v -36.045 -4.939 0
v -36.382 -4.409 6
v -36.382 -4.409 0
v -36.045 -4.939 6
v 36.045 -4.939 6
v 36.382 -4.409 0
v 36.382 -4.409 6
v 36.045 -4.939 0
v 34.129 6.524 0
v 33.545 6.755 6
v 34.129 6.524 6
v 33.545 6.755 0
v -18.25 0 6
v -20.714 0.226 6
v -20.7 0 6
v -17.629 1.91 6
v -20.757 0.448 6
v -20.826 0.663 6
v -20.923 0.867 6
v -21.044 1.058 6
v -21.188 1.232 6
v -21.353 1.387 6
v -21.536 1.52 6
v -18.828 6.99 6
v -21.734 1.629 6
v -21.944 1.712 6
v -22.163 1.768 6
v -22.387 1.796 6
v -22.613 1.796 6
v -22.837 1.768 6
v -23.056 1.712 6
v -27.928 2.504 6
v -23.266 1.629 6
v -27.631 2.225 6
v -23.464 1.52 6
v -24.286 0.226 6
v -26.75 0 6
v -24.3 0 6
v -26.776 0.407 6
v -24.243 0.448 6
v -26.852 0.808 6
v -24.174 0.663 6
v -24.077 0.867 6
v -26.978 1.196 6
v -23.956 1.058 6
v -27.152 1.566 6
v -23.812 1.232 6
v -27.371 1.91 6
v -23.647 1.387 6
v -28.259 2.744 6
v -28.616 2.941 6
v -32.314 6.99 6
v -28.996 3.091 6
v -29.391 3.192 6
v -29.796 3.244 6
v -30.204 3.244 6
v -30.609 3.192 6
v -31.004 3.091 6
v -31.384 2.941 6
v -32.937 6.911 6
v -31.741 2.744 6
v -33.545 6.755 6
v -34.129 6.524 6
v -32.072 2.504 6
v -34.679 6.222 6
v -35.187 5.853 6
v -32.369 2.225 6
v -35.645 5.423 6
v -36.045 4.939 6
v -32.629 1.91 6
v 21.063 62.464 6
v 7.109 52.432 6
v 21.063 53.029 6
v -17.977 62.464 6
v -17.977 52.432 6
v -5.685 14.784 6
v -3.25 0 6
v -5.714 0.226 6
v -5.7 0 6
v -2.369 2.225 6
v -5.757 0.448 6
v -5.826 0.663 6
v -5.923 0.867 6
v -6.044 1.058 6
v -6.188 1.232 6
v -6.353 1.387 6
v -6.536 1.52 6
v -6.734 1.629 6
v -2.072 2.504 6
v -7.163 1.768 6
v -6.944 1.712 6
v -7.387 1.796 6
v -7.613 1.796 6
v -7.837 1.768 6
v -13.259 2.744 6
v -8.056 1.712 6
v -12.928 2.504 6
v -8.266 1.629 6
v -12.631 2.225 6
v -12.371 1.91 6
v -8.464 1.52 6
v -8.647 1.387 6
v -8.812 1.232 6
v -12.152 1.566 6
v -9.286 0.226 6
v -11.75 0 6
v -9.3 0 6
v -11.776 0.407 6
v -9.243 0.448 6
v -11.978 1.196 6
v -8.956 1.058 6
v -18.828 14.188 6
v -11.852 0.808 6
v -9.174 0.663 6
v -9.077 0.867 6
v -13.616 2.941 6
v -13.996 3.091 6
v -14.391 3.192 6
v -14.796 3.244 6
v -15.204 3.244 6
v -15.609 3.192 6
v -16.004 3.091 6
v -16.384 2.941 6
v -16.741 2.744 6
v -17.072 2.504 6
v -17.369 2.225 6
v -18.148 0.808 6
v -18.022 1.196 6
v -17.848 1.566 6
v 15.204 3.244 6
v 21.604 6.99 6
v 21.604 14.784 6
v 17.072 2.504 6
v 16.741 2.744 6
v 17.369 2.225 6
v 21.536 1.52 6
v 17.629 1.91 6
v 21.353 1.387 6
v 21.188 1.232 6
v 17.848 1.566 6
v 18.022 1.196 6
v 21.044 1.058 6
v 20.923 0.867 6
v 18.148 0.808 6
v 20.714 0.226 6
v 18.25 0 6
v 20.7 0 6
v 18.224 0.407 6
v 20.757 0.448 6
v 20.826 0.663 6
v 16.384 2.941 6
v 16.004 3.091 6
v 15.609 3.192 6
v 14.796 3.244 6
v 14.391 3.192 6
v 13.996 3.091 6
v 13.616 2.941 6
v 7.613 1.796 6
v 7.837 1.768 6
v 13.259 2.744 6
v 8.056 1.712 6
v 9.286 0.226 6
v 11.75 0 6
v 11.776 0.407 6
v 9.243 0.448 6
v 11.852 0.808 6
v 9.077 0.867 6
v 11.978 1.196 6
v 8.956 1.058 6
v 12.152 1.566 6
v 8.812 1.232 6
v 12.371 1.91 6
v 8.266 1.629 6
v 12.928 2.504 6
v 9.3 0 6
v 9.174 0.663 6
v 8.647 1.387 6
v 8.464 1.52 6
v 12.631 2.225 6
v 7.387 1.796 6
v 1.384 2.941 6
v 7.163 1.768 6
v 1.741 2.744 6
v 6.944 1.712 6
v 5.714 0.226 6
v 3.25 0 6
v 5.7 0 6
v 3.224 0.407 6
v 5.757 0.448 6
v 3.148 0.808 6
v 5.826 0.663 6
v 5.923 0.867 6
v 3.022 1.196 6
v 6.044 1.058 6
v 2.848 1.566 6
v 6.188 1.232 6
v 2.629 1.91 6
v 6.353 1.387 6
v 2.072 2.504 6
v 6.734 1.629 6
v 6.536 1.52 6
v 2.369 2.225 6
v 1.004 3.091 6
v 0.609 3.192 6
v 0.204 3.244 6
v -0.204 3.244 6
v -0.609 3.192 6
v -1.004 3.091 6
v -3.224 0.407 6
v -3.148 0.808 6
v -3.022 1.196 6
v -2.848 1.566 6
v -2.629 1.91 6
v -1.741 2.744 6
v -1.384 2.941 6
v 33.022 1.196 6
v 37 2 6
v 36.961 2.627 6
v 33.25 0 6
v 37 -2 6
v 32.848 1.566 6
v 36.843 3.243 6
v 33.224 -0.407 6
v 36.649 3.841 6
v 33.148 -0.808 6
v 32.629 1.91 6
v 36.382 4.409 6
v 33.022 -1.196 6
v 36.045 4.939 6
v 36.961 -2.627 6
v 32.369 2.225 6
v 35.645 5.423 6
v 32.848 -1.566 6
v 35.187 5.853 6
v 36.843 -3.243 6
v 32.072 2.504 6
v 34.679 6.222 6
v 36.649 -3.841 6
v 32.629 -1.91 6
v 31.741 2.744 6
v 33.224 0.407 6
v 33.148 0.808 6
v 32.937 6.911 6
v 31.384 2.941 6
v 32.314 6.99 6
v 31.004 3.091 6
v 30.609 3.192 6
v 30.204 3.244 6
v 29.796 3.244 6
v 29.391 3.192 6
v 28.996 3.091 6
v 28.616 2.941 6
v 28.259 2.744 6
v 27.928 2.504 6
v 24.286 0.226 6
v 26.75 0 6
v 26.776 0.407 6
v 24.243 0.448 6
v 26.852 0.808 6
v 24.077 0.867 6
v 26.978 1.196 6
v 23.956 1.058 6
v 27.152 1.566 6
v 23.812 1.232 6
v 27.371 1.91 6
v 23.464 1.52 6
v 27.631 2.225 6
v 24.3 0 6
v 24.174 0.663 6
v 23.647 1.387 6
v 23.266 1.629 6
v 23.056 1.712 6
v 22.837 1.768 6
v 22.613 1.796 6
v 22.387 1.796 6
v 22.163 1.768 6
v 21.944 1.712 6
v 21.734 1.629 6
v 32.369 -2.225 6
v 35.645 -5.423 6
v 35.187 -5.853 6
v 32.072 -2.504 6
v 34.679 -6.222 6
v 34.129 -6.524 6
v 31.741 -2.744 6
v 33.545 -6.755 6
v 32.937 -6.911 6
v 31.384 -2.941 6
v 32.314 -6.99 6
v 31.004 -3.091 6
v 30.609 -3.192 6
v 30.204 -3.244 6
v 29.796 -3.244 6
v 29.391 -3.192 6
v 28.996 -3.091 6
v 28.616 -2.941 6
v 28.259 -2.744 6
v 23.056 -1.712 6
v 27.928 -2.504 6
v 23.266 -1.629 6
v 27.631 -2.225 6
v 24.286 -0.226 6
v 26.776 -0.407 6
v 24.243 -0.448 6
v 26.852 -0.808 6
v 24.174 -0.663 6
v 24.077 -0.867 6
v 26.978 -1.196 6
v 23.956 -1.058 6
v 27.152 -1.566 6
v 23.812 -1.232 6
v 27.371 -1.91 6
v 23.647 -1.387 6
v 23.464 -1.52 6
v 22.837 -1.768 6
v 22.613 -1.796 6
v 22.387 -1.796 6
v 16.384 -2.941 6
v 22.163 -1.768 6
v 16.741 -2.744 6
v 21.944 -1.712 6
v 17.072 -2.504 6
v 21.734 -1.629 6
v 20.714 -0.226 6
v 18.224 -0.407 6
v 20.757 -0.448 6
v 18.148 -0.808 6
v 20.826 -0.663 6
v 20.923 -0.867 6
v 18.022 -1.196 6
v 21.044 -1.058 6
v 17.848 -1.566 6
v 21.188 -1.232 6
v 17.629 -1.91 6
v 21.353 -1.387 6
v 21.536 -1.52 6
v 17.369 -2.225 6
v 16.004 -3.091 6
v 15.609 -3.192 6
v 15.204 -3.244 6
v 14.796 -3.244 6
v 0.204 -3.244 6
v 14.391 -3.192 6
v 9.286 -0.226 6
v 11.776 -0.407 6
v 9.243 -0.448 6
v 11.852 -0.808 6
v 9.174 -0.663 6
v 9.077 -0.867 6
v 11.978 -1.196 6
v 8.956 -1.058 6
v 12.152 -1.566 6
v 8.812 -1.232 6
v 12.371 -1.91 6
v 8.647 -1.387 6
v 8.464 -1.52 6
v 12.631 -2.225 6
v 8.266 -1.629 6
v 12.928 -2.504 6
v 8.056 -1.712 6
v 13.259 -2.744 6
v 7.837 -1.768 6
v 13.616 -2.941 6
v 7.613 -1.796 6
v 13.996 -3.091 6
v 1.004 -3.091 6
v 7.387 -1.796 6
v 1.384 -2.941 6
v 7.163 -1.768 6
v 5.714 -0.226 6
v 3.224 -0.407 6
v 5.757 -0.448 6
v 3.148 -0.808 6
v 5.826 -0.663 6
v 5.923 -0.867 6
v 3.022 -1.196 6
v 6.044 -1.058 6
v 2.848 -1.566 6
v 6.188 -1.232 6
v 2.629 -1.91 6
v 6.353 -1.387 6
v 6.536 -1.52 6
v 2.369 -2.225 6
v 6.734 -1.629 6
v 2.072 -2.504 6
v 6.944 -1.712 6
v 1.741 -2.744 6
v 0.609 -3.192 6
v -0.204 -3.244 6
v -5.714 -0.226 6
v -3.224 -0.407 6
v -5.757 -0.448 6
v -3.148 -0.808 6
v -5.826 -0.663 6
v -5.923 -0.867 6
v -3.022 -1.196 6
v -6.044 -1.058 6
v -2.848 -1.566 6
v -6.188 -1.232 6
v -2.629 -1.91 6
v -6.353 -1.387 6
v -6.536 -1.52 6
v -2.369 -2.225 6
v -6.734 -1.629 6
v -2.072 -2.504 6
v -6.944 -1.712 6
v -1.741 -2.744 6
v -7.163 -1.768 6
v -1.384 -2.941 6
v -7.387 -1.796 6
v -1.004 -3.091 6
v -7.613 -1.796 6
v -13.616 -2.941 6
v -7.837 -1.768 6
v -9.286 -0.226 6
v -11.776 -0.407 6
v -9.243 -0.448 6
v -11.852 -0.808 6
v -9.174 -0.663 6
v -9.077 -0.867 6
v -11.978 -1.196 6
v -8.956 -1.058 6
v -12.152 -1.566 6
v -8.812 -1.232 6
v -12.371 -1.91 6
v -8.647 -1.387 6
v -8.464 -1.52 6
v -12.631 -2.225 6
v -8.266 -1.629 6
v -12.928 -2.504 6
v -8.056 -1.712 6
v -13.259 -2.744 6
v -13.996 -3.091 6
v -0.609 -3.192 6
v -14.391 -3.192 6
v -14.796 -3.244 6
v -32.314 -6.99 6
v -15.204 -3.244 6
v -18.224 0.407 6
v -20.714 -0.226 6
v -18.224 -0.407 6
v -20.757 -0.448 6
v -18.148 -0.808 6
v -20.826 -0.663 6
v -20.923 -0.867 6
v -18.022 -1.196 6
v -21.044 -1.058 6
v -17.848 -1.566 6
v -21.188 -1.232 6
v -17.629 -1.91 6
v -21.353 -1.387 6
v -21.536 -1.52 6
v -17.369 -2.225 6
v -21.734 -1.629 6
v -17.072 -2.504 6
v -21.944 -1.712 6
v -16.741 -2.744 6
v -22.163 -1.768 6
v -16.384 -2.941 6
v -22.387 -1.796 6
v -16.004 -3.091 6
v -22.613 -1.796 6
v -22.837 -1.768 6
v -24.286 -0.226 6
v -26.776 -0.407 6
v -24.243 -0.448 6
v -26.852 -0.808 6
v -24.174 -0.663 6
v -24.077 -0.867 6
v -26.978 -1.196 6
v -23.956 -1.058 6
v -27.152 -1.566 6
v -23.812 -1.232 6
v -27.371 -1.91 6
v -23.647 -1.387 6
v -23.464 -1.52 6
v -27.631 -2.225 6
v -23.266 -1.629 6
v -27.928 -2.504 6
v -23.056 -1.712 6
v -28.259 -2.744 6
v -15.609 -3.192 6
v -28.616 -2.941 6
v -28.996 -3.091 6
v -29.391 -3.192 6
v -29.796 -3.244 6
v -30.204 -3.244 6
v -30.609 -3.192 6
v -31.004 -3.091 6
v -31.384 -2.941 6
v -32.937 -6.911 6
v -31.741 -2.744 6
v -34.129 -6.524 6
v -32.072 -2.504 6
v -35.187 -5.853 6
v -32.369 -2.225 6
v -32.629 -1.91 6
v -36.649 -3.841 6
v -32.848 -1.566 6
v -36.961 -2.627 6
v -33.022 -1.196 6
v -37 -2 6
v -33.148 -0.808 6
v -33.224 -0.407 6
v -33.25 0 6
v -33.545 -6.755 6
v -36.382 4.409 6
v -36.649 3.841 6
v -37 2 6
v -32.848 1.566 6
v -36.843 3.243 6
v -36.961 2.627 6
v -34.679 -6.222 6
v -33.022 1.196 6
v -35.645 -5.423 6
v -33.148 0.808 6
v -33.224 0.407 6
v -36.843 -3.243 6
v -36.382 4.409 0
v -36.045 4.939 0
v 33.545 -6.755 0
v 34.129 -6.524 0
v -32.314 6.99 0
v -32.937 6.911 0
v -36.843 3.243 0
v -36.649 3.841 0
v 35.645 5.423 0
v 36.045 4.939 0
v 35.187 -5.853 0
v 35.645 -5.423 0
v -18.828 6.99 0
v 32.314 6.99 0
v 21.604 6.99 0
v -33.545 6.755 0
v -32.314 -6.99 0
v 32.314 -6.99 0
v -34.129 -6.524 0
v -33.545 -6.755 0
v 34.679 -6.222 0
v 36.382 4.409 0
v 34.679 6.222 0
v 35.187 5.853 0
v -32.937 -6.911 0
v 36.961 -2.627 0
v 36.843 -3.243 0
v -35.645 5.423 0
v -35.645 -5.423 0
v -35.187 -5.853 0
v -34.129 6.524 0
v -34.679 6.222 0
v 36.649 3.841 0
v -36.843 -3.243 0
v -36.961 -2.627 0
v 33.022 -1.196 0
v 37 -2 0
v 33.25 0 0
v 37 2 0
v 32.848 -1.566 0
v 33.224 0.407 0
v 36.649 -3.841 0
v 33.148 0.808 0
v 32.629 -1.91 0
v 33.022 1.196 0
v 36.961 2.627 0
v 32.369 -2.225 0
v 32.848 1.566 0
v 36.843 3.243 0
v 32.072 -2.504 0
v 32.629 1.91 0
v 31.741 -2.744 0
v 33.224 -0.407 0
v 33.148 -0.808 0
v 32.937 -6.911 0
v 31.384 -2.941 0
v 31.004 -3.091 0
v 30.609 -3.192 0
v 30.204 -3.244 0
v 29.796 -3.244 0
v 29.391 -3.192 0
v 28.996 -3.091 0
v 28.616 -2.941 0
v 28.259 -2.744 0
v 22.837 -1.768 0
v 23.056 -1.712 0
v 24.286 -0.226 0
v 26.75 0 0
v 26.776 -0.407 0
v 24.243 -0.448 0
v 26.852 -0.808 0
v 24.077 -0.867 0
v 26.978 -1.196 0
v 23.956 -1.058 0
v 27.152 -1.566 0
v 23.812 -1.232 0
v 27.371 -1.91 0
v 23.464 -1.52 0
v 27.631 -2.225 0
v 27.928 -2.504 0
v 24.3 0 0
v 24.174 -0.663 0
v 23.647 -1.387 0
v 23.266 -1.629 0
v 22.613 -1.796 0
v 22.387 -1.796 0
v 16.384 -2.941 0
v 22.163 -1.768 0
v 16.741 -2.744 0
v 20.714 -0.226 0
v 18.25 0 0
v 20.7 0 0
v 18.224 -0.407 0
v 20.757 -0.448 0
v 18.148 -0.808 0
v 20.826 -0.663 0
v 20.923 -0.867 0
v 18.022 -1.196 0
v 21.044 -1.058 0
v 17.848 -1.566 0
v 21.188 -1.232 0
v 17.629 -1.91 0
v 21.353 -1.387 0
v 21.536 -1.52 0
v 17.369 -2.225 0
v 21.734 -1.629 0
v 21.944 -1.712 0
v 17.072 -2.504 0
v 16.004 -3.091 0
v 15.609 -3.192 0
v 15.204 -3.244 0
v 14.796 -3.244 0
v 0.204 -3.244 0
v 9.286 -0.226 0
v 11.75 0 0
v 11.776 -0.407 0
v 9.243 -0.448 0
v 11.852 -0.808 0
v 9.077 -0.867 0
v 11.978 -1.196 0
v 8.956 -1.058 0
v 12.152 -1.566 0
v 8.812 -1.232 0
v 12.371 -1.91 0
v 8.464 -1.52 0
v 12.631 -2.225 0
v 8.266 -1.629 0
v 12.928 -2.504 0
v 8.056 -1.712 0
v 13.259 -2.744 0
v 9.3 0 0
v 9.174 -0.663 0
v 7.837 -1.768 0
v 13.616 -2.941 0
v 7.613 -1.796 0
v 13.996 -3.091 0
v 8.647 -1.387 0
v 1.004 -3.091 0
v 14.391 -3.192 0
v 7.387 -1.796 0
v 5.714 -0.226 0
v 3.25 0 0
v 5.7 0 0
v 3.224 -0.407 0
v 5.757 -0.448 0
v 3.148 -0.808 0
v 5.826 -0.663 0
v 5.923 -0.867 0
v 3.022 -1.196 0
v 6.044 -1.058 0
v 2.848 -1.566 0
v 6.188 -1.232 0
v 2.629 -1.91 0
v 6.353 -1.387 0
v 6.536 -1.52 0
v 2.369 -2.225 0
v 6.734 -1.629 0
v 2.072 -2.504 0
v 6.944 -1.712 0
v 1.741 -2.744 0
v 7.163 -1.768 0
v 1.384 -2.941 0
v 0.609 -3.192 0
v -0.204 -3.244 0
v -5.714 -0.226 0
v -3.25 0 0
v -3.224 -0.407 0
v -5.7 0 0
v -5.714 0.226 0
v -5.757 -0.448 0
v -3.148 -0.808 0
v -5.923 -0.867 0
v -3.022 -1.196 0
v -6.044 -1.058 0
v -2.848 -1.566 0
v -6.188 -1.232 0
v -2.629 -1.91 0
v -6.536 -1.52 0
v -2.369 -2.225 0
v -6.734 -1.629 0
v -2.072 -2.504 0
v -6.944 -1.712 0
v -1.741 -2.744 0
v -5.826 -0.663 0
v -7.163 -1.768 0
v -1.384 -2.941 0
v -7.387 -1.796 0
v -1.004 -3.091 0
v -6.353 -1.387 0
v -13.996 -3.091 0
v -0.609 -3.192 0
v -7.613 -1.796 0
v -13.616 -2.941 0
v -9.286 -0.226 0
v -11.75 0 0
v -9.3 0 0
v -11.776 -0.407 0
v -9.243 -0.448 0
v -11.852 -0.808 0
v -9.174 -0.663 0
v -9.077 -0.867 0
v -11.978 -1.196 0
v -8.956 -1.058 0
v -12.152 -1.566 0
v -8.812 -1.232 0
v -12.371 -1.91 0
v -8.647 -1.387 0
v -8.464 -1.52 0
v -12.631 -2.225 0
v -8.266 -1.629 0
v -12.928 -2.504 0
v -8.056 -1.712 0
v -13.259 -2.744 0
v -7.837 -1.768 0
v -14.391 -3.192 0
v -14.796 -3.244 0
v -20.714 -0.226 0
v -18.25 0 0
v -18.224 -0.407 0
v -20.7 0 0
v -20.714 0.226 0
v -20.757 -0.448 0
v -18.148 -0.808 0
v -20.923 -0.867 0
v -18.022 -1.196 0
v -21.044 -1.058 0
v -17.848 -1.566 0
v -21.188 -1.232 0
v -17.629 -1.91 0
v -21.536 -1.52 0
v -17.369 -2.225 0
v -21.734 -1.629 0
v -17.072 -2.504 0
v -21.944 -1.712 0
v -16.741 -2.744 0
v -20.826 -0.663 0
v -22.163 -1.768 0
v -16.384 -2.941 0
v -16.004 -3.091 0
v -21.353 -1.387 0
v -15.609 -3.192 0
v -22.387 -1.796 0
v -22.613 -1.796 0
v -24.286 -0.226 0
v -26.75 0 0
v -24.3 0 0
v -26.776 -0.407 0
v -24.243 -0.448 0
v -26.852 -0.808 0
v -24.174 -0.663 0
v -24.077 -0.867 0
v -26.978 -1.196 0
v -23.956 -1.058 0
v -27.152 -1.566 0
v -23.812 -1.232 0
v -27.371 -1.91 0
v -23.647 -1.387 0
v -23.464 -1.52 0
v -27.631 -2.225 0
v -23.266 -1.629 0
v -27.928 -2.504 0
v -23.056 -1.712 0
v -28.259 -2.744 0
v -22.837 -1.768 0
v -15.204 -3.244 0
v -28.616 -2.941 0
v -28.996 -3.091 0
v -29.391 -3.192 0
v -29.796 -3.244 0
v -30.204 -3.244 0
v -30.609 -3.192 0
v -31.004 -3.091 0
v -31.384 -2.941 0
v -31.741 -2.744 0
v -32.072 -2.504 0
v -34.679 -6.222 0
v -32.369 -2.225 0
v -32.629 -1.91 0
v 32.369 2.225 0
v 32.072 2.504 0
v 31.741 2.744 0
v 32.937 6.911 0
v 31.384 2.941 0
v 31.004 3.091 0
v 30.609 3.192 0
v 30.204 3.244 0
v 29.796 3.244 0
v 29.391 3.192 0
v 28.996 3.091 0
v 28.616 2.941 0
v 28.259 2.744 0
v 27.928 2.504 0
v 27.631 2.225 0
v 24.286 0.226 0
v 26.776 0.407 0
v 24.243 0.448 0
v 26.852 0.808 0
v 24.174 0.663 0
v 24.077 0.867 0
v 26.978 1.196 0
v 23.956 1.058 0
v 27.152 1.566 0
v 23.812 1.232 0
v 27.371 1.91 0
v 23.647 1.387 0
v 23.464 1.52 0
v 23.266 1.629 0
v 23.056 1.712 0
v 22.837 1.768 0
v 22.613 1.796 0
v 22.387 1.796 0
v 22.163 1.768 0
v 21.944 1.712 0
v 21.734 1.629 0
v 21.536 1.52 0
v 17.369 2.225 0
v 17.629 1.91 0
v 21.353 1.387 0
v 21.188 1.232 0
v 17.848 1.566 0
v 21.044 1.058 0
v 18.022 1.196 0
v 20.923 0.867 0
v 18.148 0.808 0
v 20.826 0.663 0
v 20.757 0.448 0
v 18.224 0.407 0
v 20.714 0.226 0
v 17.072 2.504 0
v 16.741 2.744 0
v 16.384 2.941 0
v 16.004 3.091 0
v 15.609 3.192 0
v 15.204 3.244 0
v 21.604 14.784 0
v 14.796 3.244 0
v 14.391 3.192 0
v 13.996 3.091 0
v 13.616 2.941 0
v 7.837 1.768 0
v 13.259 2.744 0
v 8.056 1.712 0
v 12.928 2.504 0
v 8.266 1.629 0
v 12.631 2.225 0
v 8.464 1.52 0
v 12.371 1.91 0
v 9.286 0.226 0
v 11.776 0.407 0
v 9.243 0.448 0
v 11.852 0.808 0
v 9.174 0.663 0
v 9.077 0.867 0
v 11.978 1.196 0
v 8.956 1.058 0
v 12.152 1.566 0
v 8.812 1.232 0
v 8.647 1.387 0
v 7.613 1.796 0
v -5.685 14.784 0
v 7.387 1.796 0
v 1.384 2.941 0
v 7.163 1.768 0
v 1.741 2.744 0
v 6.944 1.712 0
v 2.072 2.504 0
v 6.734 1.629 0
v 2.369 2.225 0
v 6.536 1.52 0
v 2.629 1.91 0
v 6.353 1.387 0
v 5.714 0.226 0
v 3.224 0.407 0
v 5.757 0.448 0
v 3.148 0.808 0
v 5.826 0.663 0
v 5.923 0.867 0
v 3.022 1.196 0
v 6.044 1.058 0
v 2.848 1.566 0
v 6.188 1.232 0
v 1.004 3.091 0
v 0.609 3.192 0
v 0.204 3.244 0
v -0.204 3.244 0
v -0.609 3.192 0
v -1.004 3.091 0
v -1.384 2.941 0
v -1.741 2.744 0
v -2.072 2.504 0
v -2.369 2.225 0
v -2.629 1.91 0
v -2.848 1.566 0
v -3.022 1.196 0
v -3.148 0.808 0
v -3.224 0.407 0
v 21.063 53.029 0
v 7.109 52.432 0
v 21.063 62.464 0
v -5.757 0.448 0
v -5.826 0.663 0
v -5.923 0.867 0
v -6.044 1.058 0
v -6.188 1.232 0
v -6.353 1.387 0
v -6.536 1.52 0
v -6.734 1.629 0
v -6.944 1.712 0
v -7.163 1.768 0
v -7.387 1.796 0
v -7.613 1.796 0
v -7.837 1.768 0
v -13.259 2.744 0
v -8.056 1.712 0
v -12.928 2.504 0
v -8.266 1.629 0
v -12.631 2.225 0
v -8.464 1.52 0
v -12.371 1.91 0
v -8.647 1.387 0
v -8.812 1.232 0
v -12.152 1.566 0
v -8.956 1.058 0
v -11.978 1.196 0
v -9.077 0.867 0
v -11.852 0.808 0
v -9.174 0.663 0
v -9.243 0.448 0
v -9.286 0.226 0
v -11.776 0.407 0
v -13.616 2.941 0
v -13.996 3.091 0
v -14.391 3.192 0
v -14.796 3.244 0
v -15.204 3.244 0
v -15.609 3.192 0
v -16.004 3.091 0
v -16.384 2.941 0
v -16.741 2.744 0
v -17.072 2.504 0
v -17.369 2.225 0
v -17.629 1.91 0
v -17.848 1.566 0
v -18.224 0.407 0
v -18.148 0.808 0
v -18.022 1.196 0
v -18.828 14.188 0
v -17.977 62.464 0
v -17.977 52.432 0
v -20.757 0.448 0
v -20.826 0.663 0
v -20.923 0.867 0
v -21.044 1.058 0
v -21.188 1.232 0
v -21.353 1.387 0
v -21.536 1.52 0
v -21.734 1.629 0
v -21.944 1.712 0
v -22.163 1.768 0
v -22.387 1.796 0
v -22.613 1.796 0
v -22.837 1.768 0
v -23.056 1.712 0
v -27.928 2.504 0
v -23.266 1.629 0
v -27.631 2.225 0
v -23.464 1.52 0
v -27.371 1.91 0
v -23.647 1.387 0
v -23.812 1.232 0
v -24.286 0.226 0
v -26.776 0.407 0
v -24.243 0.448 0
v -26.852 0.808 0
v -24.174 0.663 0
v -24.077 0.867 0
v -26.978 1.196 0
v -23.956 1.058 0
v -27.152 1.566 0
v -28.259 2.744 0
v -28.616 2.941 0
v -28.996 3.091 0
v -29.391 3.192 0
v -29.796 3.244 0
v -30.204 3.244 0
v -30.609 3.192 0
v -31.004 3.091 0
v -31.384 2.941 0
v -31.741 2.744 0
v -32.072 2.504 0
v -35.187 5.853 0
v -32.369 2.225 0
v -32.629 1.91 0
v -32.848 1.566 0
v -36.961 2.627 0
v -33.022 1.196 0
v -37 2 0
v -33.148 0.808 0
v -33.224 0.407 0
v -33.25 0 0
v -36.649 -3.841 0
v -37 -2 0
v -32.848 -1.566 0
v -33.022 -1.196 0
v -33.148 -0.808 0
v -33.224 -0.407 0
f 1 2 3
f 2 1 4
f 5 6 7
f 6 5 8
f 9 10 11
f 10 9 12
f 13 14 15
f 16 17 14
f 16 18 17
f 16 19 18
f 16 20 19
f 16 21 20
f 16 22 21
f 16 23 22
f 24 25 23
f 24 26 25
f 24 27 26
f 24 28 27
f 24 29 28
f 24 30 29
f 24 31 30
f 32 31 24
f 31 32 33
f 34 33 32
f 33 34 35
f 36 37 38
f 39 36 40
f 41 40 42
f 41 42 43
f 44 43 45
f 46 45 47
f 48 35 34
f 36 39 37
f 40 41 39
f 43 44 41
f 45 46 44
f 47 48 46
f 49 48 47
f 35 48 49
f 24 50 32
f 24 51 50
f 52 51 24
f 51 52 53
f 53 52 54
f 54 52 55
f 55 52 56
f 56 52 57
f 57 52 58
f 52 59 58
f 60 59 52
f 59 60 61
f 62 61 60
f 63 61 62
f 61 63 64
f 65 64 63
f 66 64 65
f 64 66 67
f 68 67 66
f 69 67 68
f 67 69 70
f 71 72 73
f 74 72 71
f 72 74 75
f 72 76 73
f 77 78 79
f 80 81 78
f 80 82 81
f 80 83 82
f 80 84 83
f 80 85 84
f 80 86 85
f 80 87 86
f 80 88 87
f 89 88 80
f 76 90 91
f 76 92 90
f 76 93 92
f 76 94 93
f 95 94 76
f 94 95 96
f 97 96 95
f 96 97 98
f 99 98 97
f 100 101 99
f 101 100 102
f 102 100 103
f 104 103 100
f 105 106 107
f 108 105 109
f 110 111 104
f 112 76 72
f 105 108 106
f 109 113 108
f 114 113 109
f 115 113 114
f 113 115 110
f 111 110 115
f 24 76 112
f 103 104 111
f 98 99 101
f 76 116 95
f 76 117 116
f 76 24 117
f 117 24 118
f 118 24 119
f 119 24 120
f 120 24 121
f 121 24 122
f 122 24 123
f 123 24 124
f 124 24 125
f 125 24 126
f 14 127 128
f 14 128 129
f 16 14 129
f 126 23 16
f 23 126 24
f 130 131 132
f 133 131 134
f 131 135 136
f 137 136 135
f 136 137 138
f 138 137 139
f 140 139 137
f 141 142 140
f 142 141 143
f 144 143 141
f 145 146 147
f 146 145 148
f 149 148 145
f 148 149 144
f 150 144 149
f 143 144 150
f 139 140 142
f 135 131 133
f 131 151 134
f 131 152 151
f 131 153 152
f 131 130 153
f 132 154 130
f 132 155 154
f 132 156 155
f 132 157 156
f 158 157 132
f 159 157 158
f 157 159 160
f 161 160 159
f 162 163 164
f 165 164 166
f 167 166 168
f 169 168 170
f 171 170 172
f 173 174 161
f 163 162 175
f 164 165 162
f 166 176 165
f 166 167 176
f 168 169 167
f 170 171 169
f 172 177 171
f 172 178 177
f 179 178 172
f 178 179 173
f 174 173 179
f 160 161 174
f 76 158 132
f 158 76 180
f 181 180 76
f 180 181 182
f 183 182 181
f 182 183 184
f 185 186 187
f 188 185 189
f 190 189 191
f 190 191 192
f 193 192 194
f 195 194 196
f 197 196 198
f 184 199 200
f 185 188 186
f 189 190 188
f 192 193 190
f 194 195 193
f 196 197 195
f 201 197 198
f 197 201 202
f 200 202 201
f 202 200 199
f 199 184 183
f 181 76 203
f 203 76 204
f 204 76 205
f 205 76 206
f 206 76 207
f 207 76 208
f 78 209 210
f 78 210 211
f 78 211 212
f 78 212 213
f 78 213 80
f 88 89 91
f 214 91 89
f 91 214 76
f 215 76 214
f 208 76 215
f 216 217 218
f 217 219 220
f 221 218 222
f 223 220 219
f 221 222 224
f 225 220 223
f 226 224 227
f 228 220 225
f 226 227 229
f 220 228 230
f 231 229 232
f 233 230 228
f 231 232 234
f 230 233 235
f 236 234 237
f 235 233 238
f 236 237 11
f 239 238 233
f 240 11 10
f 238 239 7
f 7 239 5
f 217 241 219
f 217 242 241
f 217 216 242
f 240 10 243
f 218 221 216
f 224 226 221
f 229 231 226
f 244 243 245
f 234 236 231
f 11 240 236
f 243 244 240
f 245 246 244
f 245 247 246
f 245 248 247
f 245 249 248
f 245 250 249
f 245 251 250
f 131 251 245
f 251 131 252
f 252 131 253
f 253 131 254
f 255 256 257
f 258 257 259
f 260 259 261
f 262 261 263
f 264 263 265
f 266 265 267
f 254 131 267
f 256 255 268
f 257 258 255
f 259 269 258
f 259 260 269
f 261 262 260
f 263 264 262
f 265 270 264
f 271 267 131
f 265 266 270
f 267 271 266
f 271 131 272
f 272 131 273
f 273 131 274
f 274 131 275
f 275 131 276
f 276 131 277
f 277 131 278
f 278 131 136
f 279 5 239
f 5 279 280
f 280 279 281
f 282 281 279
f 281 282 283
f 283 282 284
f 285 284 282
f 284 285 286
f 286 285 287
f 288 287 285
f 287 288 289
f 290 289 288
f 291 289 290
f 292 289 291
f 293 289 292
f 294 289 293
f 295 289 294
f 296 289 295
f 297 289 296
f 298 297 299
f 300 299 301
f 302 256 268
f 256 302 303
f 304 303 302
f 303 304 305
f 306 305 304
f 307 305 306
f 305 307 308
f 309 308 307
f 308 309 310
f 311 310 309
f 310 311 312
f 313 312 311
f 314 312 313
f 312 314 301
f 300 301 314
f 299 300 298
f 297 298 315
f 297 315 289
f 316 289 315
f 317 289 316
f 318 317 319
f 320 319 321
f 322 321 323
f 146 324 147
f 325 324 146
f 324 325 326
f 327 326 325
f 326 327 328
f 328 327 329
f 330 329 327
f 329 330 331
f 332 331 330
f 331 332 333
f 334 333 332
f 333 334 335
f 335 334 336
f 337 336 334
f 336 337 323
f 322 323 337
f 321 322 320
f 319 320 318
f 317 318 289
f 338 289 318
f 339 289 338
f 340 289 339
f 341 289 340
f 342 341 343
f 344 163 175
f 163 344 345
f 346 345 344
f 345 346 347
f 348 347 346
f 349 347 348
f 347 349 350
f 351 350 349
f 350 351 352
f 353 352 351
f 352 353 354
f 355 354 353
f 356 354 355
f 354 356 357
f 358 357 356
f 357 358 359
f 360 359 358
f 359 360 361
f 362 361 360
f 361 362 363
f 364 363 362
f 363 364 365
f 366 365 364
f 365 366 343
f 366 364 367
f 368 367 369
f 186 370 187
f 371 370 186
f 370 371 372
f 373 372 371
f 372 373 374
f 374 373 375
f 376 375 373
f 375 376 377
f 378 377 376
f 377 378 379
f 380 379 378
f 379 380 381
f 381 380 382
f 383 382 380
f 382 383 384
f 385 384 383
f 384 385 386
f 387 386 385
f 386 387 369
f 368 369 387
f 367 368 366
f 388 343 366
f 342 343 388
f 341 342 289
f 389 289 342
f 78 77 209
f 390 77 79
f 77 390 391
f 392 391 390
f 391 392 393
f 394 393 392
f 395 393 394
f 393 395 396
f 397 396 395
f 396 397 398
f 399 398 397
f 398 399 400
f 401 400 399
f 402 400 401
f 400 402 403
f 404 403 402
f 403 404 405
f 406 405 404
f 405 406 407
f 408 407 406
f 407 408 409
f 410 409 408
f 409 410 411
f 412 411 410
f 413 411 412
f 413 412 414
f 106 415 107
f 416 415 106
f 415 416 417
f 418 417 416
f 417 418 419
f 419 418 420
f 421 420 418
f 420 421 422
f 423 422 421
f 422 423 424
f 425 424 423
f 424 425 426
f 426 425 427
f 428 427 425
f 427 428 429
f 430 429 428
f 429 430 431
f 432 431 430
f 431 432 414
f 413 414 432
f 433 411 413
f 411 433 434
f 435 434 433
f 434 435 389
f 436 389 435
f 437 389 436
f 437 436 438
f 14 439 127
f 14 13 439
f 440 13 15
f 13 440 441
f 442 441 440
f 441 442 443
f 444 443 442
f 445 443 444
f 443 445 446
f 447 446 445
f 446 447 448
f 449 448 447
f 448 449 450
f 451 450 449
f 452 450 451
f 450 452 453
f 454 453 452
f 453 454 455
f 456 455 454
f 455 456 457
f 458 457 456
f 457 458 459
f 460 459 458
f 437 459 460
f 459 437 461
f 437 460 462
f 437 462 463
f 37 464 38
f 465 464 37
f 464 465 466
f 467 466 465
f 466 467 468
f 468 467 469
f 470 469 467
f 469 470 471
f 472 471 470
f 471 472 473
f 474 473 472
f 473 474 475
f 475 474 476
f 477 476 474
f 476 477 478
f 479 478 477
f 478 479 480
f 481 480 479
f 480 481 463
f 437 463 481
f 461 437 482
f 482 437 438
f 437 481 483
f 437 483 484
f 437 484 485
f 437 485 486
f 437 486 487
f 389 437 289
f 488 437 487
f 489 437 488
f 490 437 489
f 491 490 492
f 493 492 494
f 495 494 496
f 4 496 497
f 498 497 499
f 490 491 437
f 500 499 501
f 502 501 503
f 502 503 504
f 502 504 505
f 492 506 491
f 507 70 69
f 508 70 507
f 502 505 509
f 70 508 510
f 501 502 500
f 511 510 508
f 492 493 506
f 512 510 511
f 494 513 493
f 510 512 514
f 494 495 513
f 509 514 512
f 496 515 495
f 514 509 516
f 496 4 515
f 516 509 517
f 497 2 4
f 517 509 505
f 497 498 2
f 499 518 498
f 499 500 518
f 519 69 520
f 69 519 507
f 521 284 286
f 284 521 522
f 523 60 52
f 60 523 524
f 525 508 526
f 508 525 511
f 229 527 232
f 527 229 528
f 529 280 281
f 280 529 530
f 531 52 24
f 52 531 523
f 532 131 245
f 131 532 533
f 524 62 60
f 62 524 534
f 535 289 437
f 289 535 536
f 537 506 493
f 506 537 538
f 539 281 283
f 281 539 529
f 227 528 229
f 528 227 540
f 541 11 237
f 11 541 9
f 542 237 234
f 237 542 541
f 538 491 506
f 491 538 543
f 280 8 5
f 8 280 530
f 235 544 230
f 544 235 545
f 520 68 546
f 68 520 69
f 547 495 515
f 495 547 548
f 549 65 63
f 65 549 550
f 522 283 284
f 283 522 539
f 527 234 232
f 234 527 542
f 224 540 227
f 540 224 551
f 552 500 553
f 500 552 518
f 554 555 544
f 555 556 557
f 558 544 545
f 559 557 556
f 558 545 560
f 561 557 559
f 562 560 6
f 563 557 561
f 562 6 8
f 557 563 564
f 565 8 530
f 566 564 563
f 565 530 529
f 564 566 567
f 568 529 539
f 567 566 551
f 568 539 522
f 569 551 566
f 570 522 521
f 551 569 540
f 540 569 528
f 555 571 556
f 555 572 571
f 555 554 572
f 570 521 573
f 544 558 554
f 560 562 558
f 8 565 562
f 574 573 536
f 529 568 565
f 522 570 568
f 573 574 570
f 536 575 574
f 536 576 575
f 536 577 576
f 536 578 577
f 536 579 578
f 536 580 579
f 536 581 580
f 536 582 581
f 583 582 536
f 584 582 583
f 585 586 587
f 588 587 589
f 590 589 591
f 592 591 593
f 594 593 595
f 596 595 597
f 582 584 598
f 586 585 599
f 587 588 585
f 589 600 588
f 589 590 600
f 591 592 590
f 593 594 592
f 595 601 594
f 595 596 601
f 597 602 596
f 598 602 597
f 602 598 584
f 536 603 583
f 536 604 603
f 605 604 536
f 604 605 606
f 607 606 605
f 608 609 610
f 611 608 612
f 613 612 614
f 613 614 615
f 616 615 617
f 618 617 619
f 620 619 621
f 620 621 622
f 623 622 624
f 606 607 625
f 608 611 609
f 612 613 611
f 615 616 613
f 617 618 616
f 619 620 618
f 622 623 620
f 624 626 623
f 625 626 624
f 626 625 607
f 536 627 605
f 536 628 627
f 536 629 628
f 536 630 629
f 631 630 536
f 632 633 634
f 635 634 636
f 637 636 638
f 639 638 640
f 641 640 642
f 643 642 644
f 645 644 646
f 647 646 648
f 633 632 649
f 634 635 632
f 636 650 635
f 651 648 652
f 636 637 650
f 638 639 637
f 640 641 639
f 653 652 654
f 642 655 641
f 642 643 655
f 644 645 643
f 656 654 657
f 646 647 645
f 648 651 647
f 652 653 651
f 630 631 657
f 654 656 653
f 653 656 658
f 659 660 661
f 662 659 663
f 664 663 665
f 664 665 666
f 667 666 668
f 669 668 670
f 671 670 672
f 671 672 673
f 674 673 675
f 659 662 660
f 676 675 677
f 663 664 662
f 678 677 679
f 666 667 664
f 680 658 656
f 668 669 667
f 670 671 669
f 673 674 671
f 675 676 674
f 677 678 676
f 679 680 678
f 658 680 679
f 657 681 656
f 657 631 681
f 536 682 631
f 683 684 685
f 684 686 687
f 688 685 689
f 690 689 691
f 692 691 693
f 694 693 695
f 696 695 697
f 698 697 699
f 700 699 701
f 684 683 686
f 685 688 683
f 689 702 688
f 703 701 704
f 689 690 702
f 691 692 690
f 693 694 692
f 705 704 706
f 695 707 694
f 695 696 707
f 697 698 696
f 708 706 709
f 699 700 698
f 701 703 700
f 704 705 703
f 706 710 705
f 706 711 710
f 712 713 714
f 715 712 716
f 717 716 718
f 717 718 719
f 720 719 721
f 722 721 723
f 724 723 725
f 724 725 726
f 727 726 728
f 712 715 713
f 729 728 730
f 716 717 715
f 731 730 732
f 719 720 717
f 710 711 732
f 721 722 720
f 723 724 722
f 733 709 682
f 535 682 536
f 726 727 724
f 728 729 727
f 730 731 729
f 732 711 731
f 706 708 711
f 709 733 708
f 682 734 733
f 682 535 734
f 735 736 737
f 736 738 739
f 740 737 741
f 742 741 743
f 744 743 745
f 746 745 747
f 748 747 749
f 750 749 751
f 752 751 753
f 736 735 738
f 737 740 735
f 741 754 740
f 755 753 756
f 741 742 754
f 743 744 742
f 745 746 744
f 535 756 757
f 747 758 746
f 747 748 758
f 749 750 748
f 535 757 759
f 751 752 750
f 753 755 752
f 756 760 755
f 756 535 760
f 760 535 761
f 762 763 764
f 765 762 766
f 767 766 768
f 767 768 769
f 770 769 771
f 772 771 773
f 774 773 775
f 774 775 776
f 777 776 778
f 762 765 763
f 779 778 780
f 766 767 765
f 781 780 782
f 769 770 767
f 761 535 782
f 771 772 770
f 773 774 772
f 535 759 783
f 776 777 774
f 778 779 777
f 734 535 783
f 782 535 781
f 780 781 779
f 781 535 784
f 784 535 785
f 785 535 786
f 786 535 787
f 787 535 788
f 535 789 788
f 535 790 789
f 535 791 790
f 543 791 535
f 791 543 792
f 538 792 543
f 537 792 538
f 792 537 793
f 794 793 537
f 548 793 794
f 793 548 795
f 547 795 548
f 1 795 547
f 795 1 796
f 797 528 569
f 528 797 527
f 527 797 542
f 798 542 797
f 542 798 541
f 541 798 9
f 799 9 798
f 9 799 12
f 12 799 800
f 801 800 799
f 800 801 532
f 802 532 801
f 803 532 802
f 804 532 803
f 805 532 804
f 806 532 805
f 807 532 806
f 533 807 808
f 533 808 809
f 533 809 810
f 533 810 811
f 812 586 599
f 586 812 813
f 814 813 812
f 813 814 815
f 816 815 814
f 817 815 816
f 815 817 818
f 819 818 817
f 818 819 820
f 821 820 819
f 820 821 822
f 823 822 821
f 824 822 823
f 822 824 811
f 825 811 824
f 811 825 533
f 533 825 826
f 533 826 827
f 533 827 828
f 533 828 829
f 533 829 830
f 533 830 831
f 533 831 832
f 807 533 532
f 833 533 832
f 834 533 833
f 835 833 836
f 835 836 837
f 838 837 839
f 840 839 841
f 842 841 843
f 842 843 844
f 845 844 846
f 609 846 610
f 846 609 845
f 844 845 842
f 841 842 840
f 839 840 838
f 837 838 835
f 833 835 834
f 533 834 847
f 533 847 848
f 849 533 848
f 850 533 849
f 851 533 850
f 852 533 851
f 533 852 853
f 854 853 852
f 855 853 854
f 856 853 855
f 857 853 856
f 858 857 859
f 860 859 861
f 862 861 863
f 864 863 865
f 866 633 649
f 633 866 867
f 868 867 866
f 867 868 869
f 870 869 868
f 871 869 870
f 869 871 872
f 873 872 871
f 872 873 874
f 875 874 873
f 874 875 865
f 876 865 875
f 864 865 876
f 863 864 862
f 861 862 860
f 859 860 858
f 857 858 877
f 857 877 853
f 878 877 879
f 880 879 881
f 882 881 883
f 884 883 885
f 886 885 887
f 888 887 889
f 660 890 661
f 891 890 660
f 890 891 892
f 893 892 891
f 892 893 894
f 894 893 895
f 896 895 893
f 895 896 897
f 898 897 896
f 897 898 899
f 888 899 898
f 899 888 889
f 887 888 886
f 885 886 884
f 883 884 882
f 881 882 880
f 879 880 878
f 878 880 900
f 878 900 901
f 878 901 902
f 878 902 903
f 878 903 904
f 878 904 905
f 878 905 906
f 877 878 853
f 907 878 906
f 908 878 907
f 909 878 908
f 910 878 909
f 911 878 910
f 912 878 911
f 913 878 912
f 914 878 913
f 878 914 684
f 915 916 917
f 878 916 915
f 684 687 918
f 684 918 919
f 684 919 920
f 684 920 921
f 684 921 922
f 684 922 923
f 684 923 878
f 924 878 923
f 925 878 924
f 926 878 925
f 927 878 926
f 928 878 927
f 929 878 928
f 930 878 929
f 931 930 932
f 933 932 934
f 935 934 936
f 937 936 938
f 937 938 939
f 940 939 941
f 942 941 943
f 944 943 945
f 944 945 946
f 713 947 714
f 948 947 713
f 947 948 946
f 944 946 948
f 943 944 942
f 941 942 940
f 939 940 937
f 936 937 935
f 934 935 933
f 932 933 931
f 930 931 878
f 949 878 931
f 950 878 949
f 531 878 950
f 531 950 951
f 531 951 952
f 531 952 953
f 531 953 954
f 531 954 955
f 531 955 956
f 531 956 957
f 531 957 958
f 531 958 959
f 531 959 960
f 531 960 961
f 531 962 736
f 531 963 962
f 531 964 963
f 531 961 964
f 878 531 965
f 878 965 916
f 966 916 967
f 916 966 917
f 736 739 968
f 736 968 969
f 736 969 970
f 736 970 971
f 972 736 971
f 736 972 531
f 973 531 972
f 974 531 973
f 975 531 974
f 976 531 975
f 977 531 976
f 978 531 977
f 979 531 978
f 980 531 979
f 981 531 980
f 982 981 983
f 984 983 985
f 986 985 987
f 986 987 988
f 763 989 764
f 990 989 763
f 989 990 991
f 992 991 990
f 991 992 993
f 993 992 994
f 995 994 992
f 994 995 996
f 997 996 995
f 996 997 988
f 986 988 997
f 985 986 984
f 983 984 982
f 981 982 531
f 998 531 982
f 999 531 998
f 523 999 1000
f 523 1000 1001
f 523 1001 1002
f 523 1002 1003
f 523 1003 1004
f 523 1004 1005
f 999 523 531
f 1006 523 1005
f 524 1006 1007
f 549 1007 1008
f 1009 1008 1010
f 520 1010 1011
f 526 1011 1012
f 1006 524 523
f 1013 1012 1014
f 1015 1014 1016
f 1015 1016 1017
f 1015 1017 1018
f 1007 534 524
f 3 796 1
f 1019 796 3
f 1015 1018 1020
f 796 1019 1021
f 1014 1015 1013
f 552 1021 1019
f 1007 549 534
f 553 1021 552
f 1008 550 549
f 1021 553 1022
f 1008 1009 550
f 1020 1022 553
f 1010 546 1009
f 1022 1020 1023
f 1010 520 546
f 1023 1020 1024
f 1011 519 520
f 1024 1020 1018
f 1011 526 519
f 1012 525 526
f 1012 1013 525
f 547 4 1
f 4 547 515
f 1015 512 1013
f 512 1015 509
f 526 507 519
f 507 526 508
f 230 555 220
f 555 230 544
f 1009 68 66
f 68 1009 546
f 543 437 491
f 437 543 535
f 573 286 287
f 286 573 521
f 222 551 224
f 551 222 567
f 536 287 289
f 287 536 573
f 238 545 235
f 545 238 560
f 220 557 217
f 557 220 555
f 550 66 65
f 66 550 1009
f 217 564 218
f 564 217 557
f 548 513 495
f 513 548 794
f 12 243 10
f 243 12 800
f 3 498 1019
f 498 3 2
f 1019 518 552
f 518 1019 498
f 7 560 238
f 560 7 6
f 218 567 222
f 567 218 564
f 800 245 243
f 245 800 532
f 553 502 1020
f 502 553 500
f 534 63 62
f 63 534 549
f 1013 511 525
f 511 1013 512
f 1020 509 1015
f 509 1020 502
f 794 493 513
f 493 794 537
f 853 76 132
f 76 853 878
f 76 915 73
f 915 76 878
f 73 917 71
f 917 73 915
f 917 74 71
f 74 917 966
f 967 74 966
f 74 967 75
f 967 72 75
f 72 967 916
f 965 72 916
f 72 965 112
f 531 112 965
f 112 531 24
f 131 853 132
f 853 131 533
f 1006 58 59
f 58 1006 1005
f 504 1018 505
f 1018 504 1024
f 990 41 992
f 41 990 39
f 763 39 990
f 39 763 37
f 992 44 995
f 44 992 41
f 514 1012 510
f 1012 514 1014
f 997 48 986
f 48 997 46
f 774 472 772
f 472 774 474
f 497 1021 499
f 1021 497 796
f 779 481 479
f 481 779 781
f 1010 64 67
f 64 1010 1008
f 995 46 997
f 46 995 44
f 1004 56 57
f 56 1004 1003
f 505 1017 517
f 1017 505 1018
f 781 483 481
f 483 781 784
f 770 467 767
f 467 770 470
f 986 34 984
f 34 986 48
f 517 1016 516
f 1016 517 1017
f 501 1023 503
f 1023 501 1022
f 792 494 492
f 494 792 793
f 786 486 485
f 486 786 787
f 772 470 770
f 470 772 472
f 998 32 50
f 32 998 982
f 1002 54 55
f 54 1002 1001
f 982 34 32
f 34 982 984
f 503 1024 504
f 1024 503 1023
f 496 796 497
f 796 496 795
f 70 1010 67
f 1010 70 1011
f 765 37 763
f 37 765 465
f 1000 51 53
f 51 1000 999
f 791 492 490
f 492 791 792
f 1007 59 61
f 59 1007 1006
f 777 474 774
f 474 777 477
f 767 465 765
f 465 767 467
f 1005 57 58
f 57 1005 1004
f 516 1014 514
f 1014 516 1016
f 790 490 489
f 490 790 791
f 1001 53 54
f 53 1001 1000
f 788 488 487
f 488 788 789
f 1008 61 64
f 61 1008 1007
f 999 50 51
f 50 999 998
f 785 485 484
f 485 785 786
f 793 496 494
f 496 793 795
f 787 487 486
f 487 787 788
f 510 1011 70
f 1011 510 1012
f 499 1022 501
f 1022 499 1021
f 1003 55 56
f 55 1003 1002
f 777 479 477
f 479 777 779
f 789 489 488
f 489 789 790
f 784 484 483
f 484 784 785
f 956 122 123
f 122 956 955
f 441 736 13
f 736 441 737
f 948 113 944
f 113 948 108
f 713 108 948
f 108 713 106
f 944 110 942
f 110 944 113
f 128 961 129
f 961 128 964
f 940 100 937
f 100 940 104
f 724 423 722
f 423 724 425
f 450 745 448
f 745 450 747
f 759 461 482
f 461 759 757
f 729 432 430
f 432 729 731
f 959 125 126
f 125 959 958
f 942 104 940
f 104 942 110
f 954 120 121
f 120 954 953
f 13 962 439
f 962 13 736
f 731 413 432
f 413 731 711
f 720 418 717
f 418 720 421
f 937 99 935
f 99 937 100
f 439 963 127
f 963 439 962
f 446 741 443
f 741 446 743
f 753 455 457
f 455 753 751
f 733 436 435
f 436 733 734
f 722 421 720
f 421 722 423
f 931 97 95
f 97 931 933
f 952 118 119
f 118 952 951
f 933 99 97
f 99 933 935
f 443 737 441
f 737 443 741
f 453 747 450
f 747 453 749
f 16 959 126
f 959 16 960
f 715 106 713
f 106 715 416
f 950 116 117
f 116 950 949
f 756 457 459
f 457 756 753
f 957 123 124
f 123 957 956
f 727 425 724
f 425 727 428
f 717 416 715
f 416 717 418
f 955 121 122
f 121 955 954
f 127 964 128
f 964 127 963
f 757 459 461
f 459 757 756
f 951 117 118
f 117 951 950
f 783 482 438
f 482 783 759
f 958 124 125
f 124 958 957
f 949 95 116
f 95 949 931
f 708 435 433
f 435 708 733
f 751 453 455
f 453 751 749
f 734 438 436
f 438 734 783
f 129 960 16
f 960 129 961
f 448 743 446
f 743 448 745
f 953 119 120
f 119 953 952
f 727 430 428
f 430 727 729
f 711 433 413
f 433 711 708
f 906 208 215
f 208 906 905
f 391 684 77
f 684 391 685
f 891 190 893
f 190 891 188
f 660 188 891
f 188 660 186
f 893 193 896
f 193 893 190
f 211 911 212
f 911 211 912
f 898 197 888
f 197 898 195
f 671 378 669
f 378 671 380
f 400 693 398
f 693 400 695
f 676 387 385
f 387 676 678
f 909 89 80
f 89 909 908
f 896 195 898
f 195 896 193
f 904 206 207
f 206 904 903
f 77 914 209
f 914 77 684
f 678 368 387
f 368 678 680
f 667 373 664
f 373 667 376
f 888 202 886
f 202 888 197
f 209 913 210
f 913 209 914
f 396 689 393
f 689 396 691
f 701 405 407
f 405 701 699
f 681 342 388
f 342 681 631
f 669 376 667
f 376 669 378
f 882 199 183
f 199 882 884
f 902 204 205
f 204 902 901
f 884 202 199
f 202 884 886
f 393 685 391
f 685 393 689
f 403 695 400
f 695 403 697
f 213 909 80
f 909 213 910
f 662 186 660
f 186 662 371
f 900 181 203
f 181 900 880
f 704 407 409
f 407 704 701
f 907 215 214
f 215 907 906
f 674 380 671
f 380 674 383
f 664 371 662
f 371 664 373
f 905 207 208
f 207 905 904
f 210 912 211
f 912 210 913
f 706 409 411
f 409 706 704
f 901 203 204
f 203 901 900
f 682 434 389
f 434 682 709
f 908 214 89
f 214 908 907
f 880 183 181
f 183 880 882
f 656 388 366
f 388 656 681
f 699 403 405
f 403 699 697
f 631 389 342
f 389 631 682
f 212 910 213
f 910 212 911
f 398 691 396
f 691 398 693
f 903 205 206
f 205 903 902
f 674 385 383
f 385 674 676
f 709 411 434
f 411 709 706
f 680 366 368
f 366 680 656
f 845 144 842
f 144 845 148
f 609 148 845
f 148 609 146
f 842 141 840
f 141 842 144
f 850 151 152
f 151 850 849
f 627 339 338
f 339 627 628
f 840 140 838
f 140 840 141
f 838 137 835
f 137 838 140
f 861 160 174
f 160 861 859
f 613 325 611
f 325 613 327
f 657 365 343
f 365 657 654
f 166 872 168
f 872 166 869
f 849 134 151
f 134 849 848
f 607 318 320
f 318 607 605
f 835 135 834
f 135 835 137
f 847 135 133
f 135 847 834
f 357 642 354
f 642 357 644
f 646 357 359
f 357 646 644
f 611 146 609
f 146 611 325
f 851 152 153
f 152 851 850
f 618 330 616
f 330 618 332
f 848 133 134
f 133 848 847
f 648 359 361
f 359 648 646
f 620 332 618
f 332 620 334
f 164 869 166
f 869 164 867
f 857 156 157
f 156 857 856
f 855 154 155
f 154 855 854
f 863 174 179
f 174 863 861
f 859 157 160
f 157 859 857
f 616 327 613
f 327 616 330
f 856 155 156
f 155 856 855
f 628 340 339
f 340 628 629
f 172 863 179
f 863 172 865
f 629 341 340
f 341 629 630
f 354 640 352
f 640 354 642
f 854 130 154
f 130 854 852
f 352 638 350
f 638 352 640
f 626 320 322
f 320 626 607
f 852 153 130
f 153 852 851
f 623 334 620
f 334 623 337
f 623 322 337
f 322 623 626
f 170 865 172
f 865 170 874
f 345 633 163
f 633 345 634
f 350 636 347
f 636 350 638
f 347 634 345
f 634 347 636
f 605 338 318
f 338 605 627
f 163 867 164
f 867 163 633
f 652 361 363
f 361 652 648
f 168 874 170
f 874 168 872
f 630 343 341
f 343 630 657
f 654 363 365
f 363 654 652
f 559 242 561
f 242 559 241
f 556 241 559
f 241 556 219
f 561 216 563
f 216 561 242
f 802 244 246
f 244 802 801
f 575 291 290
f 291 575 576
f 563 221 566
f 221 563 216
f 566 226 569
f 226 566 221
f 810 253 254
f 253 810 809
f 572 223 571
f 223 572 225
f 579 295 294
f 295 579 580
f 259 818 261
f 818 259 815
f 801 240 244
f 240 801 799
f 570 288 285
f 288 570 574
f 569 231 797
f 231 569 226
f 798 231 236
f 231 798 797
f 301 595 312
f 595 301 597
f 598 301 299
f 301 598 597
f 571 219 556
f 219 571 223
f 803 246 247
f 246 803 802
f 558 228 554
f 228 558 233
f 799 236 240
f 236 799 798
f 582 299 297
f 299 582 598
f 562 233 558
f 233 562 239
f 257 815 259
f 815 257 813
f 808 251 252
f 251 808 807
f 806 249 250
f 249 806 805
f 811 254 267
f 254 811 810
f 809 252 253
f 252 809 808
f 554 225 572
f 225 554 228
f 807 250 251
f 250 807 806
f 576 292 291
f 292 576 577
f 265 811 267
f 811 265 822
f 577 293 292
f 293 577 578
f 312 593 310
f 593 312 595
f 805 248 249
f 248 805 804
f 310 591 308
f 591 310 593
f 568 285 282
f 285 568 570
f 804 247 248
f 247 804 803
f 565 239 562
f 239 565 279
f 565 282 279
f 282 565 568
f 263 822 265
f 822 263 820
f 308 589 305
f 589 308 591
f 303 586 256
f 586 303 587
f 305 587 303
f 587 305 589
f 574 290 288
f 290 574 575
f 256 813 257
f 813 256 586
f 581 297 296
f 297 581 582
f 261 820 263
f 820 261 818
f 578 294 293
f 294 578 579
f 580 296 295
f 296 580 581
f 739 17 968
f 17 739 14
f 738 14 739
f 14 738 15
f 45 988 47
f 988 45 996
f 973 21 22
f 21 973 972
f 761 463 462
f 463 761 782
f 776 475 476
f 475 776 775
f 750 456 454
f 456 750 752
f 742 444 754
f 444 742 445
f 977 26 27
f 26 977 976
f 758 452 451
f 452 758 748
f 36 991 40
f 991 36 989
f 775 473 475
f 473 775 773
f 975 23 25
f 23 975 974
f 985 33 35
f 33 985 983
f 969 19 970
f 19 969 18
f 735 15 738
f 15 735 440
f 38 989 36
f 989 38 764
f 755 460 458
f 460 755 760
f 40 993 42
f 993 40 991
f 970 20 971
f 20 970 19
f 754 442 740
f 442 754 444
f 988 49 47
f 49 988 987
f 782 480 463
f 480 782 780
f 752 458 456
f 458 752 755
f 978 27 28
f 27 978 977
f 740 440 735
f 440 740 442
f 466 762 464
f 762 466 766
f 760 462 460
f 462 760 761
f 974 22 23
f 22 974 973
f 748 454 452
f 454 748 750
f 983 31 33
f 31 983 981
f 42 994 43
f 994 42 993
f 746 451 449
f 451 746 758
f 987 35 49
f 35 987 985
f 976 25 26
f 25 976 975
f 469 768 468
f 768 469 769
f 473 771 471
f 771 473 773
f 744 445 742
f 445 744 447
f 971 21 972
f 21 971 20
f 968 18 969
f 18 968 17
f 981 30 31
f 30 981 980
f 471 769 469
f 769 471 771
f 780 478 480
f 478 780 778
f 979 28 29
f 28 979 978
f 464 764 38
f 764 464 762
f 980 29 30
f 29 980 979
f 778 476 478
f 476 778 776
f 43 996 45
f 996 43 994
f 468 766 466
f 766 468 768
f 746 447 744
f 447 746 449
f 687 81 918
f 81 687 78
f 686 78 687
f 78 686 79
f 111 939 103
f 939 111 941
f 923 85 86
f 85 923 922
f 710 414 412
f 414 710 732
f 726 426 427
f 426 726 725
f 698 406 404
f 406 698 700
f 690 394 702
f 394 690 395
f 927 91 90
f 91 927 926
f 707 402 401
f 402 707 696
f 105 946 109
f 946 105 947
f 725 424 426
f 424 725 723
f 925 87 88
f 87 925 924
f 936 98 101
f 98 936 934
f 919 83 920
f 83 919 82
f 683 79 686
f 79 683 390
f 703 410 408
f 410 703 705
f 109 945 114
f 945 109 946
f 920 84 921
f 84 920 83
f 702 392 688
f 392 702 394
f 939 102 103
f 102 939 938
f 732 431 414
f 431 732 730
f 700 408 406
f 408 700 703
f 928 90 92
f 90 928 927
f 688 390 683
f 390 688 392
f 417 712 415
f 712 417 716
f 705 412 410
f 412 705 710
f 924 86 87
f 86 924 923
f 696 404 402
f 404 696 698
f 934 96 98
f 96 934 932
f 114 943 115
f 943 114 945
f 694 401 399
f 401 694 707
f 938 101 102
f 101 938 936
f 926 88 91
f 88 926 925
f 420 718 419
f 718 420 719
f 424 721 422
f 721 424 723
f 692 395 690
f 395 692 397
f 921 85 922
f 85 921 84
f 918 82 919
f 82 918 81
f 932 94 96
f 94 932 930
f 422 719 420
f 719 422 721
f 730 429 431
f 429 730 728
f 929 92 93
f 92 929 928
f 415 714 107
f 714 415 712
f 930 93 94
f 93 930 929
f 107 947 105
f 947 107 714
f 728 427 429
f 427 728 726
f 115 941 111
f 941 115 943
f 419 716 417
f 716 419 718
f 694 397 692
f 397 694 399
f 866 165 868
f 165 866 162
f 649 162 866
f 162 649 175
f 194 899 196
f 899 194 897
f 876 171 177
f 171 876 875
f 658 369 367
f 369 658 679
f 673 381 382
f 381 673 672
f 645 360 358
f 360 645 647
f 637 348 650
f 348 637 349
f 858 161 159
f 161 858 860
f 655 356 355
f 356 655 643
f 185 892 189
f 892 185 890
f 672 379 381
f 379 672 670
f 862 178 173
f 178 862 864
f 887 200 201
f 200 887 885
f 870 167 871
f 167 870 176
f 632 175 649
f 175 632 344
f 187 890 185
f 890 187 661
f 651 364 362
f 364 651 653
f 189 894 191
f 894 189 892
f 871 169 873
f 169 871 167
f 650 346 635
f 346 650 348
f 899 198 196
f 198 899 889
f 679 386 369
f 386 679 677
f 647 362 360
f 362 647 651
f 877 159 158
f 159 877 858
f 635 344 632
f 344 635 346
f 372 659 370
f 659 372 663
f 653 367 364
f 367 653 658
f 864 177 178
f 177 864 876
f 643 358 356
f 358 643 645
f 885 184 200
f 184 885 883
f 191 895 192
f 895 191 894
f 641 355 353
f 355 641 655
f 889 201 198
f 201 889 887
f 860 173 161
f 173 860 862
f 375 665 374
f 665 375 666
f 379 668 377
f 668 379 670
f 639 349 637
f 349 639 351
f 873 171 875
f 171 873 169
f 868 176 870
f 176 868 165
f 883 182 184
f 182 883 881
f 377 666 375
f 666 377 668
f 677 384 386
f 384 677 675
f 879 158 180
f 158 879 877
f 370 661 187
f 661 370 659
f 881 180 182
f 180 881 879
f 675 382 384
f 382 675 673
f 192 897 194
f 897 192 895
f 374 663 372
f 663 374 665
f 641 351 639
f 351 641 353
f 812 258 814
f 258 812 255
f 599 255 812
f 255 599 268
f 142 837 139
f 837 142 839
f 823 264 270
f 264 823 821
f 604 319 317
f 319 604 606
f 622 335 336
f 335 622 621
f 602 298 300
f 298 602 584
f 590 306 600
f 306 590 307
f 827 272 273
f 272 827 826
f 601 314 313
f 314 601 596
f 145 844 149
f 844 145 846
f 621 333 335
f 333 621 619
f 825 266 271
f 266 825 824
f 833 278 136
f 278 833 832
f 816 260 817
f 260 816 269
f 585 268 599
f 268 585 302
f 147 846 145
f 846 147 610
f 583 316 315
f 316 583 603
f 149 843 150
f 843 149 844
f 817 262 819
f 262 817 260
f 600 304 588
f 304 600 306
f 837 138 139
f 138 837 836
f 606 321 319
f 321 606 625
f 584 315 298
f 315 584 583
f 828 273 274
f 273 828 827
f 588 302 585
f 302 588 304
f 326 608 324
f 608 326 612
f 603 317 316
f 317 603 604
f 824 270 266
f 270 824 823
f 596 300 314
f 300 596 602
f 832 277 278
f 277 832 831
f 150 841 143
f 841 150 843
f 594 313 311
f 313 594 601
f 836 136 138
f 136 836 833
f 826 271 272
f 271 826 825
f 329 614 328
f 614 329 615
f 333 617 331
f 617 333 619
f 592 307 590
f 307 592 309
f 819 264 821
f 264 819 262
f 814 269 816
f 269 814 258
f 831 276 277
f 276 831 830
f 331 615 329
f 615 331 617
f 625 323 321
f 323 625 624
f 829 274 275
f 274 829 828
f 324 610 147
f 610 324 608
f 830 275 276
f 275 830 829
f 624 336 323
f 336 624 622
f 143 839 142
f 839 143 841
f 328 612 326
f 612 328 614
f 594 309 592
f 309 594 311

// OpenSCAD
$fn = 50;


difference() {
	union() {
		hull() {
			translate(v = [-32.0000000000, 2.0000000000, 0]) {
				cylinder(h = 6, r = 5);
			}
			translate(v = [32.0000000000, 2.0000000000, 0]) {
				cylinder(h = 6, r = 5);
			}
			translate(v = [-32.0000000000, -2.0000000000, 0]) {
				cylinder(h = 6, r = 5);
			}
			translate(v = [32.0000000000, -2.0000000000, 0]) {
				cylinder(h = 6, r = 5);
			}
		}
		translate(v = [0, 61.1111111111, 0]) {
			linear_extrude(height = 6) {
				text(font = "DejaVu Sans Mono:style=Bold", halign = "center", size = 57.0000000000, text = "Z", valign = "top");
			}
		}
	}
	union() {
		translate(v = [-30.0000000000, 0.0000000000, 0]) {
			translate(v = [0, 0, -100]) {
				cylinder(h = 200, r = 3.2500000000);
			}
		}
		translate(v = [-15.0000000000, 0.0000000000, 0]) {
			translate(v = [0, 0, -100]) {
				cylinder(h = 200, r = 3.2500000000);
			}
		}
		translate(v = [0, 0, -100]) {
			cylinder(h = 200, r = 3.2500000000);
		}
		translate(v = [15.0000000000, 0.0000000000, 0]) {
			translate(v = [0, 0, -100]) {
				cylinder(h = 200, r = 3.2500000000);
			}
		}
		translate(v = [30.0000000000, 0.0000000000, 0]) {
			translate(v = [0, 0, -100]) {
				cylinder(h = 200, r = 3.2500000000);
			}
		}
		translate(v = [-30.0000000000, 0.0000000000, 0]) {
			translate(v = [0, 0, -100]) {
				cylinder(h = 200, r = 1.8000000000);
			}
		}
		translate(v = [-22.5000000000, 0.0000000000, 0]) {
			translate(v = [0, 0, -100]) {
				cylinder(h = 200, r = 1.8000000000);
			}
		}
		translate(v = [-15.0000000000, 0.0000000000, 0]) {
			translate(v = [0, 0, -100]) {
				cylinder(h = 200, r = 1.8000000000);
			}
		}
		translate(v = [-7.5000000000, 0.0000000000, 0]) {
			translate(v = [0, 0, -100]) {
				cylinder(h = 200, r = 1.8000000000);
			}
		}
		translate(v = [0, 0, -100]) {
			cylinder(h = 200, r = 1.8000000000);
		}
		translate(v = [7.5000000000, 0.0000000000, 0]) {
			translate(v = [0, 0, -100]) {
				cylinder(h = 200, r = 1.8000000000);
			}
		}
		translate(v = [15.0000000000, 0.0000000000, 0]) {
			translate(v = [0, 0, -100]) {
				cylinder(h = 200, r = 1.8000000000);
			}
		}
		translate(v = [22.5000000000, 0.0000000000, 0]) {
			translate(v = [0, 0, -100]) {
				cylinder(h = 200, r = 1.8000000000);
			}
		}
		translate(v = [30.0000000000, 0.0000000000, 0]) {
			translate(v = [0, 0, -100]) {
				cylinder(h = 200, r = 1.8000000000);
			}
		}
	}
}
